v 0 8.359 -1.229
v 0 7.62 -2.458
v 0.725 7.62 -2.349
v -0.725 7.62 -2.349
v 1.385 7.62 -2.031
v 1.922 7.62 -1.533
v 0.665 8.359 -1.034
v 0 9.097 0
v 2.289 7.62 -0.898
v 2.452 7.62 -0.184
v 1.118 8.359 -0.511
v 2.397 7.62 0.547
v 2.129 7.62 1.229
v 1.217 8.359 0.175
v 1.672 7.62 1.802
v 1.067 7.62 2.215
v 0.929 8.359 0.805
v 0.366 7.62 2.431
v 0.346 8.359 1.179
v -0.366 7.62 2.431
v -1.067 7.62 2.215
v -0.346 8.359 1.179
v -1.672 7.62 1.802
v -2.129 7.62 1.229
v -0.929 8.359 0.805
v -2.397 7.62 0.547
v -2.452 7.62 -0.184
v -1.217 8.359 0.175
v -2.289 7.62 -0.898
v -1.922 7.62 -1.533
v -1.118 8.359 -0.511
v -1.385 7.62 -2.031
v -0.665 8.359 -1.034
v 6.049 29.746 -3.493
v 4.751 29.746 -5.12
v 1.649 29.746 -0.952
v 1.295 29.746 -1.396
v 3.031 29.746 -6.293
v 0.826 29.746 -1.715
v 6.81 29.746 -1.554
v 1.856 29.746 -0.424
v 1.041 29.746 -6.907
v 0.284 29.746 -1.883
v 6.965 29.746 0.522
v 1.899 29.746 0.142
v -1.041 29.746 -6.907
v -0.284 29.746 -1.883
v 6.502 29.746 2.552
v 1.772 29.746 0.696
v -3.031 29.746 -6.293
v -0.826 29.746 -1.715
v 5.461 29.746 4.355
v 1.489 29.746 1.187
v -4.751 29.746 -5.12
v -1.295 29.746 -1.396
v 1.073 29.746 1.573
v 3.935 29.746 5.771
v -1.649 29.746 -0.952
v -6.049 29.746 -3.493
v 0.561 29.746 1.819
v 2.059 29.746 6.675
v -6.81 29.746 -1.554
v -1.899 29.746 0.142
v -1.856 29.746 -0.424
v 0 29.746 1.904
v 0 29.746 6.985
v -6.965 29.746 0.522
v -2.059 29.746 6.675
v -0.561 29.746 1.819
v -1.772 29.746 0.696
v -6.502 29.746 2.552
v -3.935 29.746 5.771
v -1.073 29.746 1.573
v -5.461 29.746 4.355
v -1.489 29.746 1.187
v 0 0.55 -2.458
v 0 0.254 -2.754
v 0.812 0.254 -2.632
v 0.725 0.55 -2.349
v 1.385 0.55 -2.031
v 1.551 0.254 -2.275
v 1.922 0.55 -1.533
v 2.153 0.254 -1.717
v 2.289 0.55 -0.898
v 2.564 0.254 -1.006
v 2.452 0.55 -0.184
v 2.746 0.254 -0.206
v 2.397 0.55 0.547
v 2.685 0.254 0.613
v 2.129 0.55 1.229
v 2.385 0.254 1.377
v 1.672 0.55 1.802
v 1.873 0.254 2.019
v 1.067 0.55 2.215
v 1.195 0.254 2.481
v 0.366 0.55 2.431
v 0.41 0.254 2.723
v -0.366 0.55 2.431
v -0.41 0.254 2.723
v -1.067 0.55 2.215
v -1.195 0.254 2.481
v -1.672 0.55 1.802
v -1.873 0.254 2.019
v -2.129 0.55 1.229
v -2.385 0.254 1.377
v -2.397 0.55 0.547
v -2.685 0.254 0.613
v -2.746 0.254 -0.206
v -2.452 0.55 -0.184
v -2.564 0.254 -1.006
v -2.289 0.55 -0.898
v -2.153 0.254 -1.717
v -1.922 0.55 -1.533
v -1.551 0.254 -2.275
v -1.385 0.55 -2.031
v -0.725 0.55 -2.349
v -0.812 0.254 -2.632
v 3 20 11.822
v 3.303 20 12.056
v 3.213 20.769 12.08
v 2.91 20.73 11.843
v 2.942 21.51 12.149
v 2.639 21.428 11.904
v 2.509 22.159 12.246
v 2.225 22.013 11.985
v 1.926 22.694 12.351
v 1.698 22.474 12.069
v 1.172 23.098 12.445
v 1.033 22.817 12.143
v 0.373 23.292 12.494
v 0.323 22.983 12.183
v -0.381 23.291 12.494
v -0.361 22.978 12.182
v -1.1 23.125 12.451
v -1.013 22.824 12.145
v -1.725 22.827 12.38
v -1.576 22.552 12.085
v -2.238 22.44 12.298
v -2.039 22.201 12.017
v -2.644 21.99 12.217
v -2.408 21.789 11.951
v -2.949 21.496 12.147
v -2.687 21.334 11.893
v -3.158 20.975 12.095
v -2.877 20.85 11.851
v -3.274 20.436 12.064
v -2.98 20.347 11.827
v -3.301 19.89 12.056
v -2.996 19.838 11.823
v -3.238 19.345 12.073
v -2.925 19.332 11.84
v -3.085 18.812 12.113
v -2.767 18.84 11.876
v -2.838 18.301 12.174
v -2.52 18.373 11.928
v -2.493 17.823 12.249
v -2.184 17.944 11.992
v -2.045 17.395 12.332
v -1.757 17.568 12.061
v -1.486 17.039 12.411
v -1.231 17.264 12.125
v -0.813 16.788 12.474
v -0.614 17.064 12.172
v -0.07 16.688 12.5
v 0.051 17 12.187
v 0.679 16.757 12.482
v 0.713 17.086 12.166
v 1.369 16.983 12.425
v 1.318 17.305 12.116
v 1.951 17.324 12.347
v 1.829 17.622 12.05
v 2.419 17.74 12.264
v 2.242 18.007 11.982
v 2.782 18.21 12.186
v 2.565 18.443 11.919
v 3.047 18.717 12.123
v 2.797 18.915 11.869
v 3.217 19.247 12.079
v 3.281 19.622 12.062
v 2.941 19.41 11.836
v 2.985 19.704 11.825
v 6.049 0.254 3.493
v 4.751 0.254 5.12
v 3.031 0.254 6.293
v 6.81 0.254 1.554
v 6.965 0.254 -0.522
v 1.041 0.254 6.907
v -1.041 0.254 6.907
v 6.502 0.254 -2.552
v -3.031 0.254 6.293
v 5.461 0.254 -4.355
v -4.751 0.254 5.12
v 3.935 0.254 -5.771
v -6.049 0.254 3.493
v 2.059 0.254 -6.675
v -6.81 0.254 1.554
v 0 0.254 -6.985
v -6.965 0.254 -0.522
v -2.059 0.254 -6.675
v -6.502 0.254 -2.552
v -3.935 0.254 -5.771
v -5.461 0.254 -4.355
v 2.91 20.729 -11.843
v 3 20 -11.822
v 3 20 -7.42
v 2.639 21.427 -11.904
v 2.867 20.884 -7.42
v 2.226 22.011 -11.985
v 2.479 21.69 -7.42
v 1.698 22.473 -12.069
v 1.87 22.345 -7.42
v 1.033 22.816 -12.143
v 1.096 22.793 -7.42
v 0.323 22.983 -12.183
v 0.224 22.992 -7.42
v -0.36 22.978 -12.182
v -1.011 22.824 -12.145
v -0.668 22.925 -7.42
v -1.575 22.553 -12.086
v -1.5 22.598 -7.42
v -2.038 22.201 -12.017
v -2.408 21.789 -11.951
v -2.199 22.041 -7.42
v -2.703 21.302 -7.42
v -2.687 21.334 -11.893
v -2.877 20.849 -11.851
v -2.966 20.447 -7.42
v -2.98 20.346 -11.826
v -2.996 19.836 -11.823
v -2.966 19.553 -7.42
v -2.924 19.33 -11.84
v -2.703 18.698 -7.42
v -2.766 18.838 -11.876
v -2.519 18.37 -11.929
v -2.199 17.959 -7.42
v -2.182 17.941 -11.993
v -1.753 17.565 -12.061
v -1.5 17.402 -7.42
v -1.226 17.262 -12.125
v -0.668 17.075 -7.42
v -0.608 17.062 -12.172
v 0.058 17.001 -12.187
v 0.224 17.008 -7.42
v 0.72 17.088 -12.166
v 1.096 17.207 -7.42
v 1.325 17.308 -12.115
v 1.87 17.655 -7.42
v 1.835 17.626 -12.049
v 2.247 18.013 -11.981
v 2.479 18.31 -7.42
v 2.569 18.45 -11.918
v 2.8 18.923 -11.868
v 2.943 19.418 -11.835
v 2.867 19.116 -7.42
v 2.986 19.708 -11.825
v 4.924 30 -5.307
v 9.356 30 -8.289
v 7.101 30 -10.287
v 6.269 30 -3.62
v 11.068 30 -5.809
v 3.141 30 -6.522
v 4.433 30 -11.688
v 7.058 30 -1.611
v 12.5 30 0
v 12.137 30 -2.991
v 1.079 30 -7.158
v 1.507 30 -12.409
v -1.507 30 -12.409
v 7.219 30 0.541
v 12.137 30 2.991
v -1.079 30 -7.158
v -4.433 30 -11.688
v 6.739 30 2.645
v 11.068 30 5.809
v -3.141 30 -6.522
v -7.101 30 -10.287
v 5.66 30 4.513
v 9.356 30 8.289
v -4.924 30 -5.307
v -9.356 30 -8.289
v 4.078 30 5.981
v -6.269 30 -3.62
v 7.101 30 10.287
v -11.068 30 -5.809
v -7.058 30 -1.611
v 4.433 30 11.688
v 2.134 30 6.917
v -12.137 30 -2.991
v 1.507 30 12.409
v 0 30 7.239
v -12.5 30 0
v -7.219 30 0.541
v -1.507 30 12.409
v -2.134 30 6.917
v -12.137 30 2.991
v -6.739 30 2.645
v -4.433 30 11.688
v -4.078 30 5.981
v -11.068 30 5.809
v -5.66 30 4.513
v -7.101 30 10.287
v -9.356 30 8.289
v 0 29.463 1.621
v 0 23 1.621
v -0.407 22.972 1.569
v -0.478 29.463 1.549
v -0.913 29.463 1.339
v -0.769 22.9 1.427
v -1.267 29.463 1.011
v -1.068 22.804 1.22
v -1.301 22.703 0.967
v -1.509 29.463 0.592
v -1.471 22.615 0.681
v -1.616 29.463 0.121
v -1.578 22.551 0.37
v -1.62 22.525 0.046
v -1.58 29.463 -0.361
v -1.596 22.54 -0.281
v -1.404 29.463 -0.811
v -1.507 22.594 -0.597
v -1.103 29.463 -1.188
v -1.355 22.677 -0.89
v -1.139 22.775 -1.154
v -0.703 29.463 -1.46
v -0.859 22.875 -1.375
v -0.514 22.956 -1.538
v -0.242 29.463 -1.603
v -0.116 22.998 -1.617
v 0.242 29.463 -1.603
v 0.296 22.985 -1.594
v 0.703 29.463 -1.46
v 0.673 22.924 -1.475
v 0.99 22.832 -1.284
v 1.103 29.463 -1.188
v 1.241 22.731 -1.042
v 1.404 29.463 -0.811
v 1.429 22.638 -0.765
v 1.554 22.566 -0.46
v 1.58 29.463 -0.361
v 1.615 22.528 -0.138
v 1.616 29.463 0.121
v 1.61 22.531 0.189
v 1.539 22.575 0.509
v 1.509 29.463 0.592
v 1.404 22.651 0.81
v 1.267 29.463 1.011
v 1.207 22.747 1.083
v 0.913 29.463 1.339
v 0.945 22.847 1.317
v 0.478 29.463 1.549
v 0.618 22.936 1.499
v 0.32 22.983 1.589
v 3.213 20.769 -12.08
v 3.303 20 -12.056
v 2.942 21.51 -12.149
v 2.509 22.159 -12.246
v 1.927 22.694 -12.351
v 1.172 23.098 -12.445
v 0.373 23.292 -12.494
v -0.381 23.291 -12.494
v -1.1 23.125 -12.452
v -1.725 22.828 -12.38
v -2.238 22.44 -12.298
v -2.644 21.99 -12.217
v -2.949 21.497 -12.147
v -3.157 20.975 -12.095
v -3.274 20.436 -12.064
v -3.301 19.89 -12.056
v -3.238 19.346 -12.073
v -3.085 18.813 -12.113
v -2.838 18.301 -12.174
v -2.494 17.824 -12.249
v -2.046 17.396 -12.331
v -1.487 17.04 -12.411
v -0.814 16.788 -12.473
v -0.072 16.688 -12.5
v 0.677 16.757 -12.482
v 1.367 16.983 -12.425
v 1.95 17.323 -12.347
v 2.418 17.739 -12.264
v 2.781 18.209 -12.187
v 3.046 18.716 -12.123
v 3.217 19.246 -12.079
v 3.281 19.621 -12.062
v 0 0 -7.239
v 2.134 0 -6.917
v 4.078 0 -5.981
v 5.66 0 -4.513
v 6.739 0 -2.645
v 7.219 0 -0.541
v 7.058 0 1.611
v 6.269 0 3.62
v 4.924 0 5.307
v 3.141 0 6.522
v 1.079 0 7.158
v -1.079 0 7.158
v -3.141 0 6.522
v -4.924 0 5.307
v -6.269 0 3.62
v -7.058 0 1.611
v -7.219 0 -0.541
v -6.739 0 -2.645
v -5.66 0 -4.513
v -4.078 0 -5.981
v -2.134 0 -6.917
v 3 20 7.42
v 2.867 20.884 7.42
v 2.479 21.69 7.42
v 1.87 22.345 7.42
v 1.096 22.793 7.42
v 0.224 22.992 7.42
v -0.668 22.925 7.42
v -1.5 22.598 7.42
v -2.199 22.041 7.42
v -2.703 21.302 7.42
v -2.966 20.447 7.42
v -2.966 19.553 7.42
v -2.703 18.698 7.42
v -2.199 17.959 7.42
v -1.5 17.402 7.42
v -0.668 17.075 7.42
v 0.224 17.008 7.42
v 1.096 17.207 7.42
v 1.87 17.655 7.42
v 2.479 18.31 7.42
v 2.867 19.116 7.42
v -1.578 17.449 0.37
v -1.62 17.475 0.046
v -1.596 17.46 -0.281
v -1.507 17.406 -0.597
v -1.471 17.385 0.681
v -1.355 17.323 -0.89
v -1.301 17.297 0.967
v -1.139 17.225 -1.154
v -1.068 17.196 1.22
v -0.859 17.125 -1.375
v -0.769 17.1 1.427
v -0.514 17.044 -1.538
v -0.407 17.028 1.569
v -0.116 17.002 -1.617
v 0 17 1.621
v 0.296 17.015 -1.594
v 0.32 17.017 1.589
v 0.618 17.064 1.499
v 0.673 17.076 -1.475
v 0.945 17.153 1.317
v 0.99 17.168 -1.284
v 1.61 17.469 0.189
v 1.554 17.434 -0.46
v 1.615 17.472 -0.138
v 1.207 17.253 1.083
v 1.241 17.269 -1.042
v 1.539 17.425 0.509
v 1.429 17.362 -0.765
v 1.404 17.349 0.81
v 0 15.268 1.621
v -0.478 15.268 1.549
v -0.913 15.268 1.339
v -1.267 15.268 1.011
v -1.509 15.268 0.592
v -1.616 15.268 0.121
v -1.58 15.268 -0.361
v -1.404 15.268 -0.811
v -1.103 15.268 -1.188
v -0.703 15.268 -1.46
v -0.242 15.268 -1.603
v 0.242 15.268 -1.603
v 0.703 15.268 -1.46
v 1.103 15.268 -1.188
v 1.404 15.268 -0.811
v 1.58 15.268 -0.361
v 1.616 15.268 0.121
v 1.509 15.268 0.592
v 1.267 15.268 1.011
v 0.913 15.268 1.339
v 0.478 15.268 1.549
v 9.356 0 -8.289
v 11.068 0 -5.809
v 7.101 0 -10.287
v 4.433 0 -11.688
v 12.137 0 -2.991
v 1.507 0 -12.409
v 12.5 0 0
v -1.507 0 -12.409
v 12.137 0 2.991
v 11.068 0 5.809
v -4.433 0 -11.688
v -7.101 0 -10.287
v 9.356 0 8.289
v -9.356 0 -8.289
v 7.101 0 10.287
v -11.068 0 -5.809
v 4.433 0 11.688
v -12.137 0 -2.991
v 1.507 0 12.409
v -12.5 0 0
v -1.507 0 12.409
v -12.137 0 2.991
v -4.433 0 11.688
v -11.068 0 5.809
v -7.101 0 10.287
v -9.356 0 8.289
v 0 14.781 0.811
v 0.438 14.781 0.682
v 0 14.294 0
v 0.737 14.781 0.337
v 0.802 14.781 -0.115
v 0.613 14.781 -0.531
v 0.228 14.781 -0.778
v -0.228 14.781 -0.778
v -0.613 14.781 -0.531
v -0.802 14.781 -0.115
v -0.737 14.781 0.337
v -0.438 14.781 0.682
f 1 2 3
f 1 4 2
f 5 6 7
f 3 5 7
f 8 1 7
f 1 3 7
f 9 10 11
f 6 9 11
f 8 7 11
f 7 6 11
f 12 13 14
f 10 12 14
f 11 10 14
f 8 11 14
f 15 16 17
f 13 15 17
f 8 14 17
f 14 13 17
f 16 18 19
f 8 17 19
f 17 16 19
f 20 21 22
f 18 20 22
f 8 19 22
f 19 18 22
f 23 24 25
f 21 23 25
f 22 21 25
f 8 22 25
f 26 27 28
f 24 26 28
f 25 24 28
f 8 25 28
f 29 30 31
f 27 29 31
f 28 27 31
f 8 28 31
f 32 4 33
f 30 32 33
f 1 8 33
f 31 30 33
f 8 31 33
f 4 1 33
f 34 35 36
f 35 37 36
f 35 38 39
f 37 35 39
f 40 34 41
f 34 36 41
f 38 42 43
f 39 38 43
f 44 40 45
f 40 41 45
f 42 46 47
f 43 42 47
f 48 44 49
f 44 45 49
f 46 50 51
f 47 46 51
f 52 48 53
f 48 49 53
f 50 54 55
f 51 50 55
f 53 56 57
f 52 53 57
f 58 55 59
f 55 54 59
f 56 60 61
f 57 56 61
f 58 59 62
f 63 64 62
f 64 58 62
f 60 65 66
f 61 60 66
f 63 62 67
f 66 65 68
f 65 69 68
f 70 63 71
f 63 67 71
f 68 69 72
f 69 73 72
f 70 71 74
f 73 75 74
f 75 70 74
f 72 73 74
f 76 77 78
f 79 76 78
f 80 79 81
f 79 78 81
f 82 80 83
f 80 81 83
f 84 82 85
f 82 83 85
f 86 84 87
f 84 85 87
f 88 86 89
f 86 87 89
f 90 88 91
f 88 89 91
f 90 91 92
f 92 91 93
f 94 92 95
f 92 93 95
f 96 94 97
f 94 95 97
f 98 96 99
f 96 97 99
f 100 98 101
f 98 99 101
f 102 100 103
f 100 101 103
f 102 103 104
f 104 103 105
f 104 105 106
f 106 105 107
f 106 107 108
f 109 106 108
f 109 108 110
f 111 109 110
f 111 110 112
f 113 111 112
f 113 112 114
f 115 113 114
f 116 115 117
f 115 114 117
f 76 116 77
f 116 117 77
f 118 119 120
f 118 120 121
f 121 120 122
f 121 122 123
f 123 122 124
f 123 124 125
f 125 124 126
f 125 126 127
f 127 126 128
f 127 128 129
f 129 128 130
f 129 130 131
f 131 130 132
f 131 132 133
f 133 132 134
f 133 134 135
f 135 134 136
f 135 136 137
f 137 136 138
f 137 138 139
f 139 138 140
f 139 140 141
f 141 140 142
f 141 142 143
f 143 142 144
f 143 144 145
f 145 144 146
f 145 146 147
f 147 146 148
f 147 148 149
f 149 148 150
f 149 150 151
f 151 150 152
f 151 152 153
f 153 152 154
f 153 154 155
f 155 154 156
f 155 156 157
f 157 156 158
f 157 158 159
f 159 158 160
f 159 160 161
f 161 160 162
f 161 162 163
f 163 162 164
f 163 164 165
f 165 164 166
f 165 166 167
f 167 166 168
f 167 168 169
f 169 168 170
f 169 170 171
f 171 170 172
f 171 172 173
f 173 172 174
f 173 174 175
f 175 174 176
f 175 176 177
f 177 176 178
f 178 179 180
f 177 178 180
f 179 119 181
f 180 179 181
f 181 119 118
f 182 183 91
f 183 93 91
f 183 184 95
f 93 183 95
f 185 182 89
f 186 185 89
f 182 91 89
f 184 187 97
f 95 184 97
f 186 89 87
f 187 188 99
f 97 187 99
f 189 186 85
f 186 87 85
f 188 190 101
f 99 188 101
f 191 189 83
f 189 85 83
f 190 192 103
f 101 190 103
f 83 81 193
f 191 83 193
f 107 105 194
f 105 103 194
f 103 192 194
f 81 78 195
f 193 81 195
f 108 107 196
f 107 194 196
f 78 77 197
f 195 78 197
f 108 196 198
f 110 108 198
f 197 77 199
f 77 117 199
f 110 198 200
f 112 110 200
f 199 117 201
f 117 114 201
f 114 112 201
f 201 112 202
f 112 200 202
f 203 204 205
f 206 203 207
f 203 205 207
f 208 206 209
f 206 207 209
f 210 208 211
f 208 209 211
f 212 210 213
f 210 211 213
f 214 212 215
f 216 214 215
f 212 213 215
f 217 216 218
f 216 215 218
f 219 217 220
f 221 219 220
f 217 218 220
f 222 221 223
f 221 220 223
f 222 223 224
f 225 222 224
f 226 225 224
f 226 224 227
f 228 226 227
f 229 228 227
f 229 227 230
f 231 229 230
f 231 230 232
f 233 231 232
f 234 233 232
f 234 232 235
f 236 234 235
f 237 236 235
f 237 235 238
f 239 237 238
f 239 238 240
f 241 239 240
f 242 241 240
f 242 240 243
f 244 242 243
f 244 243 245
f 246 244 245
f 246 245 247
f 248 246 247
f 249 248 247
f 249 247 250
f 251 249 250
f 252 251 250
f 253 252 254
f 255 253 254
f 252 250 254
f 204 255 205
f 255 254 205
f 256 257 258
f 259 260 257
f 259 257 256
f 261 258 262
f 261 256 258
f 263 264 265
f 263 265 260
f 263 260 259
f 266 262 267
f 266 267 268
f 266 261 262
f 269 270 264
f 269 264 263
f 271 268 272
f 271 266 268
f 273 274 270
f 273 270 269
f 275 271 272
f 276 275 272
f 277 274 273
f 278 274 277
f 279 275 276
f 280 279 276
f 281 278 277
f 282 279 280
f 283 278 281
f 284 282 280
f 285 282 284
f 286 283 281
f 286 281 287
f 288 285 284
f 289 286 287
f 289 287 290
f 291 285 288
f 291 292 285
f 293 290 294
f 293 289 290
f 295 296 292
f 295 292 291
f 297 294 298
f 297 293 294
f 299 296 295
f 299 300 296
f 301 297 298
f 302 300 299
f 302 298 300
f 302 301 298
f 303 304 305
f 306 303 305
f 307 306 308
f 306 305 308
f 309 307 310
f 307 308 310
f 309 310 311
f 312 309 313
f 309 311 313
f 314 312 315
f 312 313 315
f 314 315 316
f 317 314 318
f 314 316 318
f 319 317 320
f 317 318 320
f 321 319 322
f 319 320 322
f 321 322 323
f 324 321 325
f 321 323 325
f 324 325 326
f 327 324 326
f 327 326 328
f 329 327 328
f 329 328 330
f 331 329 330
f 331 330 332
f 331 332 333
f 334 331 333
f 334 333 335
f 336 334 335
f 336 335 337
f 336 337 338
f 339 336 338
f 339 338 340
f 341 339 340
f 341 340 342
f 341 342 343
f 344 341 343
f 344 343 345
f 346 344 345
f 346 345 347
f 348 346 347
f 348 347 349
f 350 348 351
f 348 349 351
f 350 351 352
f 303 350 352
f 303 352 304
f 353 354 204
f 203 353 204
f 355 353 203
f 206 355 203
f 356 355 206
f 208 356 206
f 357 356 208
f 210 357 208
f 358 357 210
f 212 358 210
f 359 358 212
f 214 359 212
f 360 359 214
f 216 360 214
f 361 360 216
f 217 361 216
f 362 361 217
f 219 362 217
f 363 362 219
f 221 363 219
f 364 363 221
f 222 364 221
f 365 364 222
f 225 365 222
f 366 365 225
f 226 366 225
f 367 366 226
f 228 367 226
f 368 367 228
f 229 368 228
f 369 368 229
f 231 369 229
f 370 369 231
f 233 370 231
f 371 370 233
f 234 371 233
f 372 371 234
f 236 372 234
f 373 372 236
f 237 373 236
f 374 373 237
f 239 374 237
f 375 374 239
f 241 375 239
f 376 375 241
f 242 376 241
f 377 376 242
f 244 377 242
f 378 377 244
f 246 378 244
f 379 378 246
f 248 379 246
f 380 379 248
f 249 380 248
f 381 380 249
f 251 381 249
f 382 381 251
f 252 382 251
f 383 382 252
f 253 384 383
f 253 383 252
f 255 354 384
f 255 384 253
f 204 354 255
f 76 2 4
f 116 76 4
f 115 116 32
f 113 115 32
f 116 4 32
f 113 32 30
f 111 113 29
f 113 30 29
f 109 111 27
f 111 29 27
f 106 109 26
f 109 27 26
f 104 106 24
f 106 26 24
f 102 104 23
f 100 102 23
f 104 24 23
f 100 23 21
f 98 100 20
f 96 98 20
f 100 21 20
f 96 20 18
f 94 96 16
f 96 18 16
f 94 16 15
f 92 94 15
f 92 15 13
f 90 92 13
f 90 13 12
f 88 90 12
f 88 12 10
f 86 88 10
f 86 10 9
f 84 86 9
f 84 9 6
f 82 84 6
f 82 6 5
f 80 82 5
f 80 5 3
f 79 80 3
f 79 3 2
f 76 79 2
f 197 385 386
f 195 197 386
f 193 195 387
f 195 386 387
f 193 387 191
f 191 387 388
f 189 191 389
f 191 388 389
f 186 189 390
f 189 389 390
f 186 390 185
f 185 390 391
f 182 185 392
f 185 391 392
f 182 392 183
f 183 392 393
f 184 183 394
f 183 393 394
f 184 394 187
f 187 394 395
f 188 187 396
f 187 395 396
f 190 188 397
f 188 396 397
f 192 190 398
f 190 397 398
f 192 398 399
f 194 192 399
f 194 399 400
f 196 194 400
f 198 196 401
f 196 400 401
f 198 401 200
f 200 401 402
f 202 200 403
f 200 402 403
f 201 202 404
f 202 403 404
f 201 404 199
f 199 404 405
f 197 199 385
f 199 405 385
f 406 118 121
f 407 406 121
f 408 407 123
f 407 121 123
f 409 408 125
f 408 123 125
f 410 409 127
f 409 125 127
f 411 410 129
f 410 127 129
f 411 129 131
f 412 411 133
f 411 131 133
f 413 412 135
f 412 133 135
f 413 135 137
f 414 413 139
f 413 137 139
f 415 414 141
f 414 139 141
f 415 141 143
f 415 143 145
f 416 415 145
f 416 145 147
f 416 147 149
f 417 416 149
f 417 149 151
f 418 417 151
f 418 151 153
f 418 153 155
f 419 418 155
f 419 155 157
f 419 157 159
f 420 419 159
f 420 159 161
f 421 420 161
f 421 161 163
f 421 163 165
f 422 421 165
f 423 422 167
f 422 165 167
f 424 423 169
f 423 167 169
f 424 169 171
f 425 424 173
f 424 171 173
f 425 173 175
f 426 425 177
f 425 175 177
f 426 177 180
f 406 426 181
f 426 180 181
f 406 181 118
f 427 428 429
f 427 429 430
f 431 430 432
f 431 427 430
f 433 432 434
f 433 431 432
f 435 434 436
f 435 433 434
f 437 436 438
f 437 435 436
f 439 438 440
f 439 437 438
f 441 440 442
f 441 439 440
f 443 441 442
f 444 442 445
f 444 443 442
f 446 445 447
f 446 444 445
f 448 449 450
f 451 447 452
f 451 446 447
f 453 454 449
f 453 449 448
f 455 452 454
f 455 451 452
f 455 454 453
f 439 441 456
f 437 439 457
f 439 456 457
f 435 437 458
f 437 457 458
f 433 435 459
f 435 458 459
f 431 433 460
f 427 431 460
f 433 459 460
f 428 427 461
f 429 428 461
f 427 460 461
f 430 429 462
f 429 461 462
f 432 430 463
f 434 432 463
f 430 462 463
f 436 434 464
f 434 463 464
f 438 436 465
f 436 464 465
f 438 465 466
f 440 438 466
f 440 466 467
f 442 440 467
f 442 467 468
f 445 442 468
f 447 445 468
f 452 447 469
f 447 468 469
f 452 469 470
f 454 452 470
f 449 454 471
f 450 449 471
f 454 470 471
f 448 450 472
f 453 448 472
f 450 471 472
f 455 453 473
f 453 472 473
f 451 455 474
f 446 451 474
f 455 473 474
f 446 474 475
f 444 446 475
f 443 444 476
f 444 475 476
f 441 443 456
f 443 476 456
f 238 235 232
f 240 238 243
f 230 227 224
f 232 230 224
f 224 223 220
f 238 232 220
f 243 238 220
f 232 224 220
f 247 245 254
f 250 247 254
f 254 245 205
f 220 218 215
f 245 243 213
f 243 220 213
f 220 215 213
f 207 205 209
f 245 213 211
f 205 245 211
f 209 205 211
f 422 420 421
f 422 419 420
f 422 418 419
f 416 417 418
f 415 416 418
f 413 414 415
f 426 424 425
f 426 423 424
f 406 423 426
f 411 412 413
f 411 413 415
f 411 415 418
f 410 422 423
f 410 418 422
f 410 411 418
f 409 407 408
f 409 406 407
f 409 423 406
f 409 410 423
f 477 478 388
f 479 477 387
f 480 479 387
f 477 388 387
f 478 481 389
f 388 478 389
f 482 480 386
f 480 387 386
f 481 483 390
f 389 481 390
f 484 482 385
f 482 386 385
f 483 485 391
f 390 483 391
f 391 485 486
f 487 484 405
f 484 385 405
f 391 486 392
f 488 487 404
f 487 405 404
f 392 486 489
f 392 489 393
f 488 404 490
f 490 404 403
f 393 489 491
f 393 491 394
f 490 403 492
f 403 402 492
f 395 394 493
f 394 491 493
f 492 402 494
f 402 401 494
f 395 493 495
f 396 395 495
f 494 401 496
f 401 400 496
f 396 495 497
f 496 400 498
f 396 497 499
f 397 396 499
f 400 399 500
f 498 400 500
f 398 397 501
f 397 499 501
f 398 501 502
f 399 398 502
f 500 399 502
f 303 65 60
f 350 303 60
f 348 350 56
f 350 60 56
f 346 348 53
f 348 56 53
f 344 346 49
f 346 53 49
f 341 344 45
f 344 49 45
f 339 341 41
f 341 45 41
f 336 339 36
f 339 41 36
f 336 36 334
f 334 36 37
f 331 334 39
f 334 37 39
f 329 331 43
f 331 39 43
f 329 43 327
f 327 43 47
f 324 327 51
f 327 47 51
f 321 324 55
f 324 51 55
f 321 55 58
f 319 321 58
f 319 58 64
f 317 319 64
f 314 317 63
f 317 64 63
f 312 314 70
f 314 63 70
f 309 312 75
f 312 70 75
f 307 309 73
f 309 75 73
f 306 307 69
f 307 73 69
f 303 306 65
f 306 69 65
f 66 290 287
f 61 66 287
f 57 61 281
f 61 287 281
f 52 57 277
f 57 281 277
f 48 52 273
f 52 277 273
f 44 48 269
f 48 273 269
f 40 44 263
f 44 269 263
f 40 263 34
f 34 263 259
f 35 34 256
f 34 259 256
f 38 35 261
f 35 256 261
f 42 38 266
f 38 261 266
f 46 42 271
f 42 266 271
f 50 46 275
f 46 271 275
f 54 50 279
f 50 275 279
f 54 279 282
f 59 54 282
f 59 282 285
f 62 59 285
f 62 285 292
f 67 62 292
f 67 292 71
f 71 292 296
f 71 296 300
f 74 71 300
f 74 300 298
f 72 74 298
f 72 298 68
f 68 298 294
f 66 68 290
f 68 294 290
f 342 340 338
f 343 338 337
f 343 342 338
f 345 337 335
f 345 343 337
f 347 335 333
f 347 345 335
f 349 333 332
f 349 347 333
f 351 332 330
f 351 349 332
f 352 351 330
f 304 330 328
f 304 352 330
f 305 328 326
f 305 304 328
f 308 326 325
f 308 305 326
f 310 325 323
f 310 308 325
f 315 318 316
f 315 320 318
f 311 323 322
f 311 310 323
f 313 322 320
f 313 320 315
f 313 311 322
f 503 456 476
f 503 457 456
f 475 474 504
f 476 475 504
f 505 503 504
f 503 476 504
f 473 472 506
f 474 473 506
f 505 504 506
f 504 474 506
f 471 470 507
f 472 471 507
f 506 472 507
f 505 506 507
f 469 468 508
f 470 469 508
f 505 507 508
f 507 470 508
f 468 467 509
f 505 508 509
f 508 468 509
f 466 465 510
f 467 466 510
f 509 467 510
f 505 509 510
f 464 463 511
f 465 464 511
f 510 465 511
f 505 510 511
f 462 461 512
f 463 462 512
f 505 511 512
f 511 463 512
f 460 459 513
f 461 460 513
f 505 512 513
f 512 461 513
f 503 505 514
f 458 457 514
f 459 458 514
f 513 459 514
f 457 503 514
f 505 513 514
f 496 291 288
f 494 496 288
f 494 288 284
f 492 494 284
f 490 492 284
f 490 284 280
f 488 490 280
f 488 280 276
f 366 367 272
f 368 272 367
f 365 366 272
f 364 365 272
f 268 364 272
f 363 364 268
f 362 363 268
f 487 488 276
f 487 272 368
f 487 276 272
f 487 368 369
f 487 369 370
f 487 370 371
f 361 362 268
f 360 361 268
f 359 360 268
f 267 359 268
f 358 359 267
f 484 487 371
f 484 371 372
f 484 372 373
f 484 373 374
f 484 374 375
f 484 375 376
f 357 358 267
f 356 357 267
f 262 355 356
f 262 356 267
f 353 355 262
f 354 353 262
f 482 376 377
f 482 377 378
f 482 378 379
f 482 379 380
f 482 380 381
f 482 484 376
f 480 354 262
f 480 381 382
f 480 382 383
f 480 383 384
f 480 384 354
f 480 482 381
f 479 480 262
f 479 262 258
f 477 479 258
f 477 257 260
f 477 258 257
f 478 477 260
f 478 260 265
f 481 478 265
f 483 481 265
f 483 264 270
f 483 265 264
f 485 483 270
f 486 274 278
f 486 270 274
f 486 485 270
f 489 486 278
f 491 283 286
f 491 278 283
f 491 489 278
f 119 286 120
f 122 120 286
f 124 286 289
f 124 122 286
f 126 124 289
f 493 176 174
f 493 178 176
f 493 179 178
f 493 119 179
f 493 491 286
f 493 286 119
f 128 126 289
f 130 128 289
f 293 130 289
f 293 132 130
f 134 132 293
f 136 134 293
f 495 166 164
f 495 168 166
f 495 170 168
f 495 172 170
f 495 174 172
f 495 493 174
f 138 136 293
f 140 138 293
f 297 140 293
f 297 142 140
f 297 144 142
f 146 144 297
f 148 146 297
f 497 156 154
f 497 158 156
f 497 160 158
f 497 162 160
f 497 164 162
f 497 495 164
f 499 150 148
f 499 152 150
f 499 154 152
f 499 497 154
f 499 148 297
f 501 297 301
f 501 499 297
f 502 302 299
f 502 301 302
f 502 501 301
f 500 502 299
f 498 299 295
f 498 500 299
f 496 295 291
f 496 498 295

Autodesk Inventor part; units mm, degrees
ref_plane "YZ Plane" through (0, 0, 0) normal (1, 0, 0) x (0, 1, 0)
ref_plane "XZ Plane" through (0, 0, 0) normal (0, 1, 0) x (-1, 0, 0)
ref_plane "XY Plane" through (0, 0, 0) normal (0, 0, 1) x (1, 0, 0)
sketch "Sketch1" plane through (0, 0, 0) normal (0, 1, 0) x (-1, 0, 0)
  circle A0 centre (0, 0) radius 12.5
  dimension "d0" = 25
extrude "Extrusion1" add sketch "Sketch1" along normal blind 30
hole "ReliefTop" at (0, 30, 0) direction (0, -1, 0) diameter 13.97 depth 0.254 countersink diameter 14.478 countersink angle 90
hole "ReliefBottom" at (0, 0, 0) direction (0, 1, 0) diameter 13.97 depth 0.254 countersink diameter 14.478 countersink angle 90
hole "MountBottomM6" at (0, 0.254, 0) direction (0, 1, 0) diameter 4.917 depth 7.366 tip angle 118 countersink diameter 5.508 countersink angle 90 thread size "M6x1" class "6H" standard "ISO Metric profile"
hole "MountTopM4" at (0, 29.746, 0) direction (0, -1, 0) diameter 3.242 depth 14.478 tip angle 118 countersink diameter 3.808 countersink angle 90 thread size "M4x0.7" class "6H" standard "ISO Metric profile"
sketch "Sketch2" plane through (0, 0, 0) normal (0, 0, 1) x (1, 0, 0)
  circle A0 centre (0, 20) radius 3
  line L0 (-12.5, 0) -> (12.5, 0) projected
  line L1 (0, -4.6) -> (0, 27.6) projected
  point P0 (0, 0)
  dimension "d49" = 6
  dimension "d50" = 20
extrude "Extrusion2" cut sketch "Sketch2" along normal through all both and the other way through all
chamfer "Chamfer1" distance 0.313 angle 45 2 edges at (-3, 19.9998, 12.1347) (-3, 19.9998, -12.1347)
extrude "Extrusion3" add sketch "Sketch2" along normal mid plane 14.84
equation "\"d1\" = height"
equation "\"d5\" = reliefMinor"
equation "\"d7\" = reliefMajor"
equation "\"d10\" = reliefDepth"
equation "\"d14\" = reliefMinor"
equation "\"d16\" = reliefMajor"
equation "\"d19\" = reliefDepth"
equation "\"d25\" = chamferM6"
equation "\"d28\" = depthM6"
equation "\"d40\" = chamferM4"
equation "\"d43\" = depthM4"
equation "\"reliefDepth\" = 0.254"
equation "\"reliefMinor\" = 13.97"
equation "\"reliefMajor\" = 14.478"
equation "\"chamferM6\" = 5.508"
equation "\"chamferM4\" = 3.808"
equation "\"depthM6\" = 7.366"
equation "\"depthM4\" = 14.478"
equation "\"height\" = 30"
properties part number "PLS-P642H0300A00_M" material "Stainless Steel"
